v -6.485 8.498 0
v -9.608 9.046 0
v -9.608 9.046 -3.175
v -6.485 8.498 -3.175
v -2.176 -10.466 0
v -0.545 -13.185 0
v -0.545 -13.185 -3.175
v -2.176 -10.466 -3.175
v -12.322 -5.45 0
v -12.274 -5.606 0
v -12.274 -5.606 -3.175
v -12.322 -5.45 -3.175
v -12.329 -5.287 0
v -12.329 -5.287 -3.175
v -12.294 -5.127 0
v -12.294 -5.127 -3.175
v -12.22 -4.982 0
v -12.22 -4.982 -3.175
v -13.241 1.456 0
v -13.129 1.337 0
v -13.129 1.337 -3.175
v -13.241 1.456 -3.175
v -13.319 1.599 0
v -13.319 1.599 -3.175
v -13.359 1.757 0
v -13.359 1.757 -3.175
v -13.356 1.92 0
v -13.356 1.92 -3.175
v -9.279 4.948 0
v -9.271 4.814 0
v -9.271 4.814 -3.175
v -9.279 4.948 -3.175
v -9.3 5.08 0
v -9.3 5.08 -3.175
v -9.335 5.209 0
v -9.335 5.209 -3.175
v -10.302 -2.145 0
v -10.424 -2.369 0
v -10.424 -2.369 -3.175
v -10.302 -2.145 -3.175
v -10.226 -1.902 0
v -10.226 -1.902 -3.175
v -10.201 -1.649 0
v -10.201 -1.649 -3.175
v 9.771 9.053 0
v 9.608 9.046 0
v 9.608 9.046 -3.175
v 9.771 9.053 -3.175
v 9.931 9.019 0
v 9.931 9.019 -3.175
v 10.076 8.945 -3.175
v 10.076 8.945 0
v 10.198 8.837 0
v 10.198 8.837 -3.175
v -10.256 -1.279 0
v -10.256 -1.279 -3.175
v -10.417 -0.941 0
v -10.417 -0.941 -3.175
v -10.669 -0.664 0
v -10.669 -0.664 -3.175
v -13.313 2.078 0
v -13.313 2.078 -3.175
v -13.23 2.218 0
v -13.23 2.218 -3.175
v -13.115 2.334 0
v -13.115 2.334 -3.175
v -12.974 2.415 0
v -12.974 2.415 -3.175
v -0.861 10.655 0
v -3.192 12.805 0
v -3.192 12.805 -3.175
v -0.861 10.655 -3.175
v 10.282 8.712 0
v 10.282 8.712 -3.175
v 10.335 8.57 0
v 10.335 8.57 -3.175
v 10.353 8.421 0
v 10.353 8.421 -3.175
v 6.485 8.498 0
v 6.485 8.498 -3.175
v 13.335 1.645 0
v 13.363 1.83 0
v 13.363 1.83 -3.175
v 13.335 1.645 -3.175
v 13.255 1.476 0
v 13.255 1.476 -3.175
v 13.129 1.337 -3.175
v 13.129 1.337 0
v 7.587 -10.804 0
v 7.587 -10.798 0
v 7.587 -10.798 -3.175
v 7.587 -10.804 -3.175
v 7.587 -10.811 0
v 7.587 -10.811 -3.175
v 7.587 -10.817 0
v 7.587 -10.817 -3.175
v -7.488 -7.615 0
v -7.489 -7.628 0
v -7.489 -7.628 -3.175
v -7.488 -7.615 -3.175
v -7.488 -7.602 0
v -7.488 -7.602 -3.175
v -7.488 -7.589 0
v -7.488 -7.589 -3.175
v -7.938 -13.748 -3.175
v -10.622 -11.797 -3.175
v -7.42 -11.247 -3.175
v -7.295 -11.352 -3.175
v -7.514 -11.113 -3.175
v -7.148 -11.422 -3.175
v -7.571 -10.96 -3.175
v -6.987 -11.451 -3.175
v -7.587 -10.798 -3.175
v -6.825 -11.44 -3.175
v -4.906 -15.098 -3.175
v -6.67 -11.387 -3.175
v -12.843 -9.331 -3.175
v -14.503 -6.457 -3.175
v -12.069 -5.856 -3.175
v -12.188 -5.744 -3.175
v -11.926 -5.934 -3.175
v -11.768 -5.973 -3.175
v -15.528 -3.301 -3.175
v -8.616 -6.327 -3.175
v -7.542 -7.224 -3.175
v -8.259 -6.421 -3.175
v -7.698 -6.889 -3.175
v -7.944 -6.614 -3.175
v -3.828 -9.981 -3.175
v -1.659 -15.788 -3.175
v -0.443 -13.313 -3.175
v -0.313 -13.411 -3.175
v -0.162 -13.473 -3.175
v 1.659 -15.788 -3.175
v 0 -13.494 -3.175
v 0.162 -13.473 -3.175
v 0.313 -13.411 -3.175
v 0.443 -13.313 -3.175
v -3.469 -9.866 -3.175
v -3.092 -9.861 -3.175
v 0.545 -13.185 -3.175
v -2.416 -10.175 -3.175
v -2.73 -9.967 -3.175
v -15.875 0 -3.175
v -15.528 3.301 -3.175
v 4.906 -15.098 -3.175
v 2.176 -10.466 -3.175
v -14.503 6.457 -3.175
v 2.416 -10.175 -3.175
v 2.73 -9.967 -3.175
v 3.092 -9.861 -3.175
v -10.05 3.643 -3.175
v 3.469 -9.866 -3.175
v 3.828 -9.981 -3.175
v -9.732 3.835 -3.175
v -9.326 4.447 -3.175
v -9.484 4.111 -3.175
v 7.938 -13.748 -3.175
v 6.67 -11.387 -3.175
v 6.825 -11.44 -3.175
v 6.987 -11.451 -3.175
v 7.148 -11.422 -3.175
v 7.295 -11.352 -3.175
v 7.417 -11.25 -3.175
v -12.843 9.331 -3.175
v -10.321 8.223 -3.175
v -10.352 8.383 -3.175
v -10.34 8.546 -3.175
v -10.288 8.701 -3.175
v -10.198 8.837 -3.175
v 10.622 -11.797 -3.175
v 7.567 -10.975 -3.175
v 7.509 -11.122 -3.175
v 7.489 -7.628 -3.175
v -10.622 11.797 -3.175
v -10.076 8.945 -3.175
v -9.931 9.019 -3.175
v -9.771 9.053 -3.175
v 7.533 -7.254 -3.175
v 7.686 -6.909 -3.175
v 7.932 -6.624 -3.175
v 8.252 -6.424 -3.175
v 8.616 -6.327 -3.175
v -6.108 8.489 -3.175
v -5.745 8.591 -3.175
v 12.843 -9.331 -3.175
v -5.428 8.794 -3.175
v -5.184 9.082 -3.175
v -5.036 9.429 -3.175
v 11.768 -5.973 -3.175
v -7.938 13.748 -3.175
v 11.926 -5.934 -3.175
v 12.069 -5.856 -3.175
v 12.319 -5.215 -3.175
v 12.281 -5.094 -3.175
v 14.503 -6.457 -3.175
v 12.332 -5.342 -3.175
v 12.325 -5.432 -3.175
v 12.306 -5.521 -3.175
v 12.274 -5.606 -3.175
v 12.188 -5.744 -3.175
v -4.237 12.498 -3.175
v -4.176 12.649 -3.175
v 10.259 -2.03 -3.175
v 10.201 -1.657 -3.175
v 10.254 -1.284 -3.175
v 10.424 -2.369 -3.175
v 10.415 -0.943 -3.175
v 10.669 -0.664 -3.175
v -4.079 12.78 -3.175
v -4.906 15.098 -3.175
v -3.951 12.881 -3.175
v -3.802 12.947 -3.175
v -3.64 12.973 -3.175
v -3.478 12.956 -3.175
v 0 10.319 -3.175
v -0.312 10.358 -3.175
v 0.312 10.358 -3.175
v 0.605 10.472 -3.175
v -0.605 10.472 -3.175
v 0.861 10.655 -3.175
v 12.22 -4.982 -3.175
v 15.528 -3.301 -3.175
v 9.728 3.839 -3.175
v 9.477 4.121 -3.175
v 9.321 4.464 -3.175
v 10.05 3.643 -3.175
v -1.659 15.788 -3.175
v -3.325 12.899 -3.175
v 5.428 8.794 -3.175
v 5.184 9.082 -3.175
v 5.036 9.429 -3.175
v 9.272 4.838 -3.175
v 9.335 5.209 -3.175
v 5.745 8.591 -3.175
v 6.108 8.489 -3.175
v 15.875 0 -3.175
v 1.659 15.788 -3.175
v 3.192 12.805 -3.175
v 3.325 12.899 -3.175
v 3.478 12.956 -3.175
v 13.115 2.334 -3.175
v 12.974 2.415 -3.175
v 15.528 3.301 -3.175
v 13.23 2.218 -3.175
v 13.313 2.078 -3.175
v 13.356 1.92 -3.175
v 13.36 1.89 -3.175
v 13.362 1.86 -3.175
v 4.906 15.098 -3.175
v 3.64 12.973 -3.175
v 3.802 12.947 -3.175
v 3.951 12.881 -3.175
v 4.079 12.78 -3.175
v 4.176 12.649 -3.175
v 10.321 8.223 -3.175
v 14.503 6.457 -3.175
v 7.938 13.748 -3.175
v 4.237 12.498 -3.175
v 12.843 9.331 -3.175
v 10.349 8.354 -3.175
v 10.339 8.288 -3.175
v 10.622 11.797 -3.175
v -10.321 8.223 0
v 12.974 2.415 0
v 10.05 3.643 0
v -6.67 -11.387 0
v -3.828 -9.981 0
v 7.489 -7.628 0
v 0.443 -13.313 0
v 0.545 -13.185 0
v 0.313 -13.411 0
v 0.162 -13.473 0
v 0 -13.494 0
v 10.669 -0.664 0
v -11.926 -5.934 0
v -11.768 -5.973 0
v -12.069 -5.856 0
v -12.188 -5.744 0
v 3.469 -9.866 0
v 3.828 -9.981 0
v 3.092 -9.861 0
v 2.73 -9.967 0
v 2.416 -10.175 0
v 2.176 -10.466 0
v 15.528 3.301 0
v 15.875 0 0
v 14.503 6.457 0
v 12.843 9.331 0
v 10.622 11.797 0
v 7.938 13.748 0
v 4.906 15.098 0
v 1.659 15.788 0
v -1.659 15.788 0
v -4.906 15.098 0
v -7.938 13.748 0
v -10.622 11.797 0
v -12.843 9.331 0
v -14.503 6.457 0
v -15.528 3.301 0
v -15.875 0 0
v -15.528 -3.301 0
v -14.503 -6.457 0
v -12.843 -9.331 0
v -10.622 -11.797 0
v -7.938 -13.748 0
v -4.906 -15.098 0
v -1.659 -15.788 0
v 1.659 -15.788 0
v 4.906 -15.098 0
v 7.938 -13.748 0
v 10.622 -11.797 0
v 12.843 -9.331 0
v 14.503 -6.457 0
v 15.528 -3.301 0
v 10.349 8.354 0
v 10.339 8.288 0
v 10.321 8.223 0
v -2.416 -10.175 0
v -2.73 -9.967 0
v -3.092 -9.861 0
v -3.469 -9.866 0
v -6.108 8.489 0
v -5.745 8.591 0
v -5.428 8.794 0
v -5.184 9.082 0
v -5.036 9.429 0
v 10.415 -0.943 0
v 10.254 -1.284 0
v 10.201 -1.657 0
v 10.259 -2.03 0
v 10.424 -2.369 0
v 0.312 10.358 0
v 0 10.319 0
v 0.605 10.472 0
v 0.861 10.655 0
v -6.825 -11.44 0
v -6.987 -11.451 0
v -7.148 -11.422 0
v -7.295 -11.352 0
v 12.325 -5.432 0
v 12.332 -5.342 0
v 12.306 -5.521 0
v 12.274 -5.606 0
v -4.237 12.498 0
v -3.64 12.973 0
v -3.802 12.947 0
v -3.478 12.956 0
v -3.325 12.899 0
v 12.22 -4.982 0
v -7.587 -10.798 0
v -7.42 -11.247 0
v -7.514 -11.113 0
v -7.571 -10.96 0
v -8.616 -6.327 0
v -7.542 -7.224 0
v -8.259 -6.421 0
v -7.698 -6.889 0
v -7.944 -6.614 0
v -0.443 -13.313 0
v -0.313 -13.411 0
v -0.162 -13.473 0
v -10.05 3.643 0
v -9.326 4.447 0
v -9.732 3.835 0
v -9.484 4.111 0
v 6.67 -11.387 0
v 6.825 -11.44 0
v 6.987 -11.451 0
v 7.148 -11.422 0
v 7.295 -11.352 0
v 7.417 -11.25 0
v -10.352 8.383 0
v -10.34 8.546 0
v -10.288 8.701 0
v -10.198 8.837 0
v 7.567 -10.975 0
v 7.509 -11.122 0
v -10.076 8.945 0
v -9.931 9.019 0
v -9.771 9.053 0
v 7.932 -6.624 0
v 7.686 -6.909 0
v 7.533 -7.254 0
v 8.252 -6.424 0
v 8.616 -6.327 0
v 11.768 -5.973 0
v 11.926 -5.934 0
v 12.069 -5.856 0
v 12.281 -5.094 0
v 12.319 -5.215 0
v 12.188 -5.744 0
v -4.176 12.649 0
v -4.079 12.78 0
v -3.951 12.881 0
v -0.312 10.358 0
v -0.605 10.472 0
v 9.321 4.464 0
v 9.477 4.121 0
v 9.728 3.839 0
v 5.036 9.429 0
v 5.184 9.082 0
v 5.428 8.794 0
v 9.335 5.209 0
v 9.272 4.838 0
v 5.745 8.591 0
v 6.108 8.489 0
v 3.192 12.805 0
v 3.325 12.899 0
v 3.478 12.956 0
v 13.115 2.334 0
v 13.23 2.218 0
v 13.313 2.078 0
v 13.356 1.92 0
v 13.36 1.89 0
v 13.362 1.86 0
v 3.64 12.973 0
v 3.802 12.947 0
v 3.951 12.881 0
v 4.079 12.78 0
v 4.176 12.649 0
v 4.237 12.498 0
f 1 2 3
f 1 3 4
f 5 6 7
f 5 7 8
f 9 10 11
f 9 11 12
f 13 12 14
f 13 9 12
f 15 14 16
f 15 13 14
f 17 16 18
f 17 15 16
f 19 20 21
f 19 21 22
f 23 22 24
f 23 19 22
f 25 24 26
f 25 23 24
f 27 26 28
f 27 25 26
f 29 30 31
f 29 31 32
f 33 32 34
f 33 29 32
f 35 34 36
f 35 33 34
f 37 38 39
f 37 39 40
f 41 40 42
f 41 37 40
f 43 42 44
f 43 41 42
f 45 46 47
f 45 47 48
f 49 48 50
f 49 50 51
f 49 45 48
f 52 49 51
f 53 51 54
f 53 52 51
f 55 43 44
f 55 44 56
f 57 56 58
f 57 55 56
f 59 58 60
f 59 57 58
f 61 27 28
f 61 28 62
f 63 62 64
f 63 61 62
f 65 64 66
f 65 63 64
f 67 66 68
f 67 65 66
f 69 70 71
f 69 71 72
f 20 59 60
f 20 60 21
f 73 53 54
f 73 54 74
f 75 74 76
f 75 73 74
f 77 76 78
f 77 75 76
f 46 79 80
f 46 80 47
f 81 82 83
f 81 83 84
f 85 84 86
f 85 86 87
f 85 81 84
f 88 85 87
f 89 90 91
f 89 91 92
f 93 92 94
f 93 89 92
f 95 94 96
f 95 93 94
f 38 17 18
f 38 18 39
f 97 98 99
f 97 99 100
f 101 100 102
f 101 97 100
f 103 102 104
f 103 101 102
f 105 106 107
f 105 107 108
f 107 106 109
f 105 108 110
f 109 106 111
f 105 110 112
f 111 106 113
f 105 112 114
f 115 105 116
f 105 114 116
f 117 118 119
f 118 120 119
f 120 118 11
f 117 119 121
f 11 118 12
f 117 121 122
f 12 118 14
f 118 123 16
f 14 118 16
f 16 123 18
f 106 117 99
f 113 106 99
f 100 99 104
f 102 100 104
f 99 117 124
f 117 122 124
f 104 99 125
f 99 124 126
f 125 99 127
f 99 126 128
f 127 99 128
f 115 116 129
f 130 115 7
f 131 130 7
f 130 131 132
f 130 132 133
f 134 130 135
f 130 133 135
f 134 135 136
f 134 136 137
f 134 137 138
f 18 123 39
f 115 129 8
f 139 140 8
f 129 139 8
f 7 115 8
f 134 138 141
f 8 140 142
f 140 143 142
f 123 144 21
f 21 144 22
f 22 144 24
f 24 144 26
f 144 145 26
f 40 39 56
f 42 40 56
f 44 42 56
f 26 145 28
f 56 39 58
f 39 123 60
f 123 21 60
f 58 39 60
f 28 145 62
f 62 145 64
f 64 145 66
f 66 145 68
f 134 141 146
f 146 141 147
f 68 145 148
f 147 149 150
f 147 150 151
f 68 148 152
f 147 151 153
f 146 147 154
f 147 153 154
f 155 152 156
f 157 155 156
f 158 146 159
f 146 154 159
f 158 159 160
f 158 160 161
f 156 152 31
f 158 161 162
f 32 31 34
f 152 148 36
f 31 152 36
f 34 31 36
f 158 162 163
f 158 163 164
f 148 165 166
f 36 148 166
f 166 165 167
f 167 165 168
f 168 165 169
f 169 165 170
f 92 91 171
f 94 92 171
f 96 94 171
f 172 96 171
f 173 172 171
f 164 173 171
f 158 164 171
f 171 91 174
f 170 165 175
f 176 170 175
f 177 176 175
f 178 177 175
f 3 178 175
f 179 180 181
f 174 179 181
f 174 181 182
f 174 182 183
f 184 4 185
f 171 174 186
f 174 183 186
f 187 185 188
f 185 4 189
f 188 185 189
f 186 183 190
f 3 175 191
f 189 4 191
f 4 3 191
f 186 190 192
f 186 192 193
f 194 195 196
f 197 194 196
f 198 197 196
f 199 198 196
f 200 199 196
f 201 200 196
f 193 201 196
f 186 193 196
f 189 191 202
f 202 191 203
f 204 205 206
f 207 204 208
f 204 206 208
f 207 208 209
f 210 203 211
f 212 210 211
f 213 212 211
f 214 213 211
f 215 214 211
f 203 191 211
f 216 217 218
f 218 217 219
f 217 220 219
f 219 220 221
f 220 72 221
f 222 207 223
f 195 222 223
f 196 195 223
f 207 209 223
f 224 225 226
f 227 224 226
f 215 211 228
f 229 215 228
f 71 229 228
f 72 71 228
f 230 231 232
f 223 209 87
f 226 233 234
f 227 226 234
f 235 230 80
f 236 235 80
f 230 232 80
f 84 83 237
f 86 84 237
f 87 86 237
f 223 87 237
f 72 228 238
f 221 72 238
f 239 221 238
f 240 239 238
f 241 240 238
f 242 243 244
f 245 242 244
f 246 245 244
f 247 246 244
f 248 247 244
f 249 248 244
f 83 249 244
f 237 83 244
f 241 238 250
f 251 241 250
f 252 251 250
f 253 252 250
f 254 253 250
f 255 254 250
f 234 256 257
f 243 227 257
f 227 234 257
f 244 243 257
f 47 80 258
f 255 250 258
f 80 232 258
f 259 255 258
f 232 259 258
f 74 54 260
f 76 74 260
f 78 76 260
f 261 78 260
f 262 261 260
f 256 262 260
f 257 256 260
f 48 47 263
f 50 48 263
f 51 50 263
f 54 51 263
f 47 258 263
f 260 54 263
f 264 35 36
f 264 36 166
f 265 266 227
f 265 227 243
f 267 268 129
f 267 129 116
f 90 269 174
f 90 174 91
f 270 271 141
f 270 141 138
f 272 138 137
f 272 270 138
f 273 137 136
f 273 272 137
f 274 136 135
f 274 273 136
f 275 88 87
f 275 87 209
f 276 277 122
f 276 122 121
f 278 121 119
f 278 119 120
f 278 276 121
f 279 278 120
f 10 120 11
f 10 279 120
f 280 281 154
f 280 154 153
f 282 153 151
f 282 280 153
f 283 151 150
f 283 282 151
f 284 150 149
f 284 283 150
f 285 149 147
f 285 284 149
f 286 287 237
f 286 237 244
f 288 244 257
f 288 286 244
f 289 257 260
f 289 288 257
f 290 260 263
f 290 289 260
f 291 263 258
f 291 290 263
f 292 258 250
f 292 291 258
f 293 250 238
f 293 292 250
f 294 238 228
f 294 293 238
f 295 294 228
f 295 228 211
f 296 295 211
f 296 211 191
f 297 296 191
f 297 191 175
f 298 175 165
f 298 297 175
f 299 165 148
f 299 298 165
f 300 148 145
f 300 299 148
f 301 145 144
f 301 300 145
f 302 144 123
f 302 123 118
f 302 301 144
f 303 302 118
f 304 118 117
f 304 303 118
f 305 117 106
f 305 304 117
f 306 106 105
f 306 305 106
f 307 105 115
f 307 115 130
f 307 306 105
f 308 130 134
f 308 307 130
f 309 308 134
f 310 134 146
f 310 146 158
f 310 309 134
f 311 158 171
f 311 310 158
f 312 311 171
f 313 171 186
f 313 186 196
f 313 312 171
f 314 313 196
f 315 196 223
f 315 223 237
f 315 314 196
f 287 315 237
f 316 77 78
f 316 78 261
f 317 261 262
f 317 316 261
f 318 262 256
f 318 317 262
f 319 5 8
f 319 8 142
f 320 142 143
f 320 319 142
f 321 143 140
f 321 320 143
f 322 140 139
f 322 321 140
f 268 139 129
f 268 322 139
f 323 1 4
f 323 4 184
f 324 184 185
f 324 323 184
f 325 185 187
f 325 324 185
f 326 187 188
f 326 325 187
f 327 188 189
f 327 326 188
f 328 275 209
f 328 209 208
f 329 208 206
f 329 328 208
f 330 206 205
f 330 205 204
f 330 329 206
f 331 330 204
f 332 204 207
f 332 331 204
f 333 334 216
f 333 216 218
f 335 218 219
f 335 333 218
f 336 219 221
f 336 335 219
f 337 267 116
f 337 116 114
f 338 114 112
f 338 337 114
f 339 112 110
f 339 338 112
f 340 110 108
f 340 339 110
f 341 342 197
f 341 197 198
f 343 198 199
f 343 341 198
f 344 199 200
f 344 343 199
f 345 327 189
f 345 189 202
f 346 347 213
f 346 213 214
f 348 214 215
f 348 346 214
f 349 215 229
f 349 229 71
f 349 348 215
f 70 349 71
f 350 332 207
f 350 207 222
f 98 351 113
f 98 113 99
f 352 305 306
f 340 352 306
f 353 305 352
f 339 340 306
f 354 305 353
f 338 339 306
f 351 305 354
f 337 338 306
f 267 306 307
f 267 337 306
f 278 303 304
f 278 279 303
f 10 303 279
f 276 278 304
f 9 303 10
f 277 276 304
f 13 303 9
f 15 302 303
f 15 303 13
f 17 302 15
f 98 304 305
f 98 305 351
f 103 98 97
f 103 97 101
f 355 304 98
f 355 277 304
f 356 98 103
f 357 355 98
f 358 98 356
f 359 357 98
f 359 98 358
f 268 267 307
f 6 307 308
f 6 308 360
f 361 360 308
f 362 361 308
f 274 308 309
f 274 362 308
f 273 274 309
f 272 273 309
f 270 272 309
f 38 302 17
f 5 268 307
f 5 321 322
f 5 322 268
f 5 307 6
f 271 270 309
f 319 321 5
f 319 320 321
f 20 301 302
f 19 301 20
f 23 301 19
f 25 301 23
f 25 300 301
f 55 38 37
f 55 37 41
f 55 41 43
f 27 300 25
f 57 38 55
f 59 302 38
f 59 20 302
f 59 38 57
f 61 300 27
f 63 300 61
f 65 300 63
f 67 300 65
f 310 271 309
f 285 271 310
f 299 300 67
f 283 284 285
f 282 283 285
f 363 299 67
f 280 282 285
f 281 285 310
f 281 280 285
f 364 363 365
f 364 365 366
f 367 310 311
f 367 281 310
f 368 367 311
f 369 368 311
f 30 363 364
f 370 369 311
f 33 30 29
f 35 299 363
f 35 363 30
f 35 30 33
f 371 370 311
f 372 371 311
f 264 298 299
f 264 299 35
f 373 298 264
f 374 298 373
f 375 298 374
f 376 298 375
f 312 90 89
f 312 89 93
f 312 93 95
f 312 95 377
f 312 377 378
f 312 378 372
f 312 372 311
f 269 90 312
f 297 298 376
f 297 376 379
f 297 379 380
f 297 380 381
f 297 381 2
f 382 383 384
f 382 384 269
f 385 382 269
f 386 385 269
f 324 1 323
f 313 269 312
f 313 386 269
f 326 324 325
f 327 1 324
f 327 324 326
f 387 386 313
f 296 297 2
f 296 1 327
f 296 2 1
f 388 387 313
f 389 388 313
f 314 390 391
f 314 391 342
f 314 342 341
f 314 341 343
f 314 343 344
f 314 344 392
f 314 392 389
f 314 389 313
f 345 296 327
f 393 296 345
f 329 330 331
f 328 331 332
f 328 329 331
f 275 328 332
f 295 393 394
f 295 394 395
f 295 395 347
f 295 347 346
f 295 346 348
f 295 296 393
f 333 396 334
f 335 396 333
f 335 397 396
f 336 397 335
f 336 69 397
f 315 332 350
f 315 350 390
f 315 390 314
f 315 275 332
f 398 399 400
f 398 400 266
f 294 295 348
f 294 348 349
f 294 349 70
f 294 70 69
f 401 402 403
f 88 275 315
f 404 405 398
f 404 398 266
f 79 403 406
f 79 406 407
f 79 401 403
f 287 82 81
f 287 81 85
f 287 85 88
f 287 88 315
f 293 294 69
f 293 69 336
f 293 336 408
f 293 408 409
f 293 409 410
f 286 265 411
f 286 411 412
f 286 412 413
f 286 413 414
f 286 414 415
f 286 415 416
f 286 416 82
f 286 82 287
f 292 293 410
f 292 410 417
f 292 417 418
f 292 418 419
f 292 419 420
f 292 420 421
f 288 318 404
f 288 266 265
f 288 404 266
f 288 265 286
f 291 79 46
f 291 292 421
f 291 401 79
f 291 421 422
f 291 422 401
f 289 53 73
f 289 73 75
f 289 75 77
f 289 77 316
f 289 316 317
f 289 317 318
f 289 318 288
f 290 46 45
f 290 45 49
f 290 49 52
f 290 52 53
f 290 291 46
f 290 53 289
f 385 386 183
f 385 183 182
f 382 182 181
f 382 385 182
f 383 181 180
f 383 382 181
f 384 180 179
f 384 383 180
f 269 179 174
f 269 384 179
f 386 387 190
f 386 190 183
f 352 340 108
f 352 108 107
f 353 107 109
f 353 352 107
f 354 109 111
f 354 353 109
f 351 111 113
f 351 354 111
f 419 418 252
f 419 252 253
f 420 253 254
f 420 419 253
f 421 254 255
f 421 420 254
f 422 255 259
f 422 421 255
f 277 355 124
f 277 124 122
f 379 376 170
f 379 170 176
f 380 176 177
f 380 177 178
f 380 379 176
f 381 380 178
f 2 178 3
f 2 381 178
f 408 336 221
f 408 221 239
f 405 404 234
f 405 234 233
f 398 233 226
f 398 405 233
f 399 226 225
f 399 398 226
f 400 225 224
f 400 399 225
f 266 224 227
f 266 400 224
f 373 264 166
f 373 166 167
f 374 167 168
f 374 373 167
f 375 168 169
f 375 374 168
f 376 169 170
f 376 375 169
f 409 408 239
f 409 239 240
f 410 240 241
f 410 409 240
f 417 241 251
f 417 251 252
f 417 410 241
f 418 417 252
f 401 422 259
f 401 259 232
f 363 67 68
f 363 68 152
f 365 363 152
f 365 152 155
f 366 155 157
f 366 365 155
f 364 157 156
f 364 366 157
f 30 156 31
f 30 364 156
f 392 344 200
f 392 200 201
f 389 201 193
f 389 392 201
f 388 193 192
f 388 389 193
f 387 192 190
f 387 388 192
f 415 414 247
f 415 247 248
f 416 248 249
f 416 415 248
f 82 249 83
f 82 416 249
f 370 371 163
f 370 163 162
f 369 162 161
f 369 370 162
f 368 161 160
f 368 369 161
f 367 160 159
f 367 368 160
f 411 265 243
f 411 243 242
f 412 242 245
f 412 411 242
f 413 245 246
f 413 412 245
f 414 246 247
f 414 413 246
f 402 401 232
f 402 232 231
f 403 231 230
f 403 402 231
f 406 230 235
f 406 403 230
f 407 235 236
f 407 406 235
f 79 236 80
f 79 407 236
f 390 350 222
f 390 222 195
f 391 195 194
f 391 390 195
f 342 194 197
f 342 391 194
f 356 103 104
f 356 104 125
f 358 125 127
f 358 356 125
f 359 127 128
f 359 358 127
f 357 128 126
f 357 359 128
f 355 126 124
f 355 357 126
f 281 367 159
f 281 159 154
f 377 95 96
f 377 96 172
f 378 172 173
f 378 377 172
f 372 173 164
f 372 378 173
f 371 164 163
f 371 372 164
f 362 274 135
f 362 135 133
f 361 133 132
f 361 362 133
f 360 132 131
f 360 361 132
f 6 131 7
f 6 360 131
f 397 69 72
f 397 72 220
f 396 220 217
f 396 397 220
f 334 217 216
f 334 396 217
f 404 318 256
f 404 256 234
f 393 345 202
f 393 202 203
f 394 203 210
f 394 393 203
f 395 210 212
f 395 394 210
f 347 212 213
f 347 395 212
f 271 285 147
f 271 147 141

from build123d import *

# Parameters (mm, degrees)
F0_R     = 15.875
F1_DEPTH = 3.175


with BuildPart() as f1:
    # F0 (on Top) → F1 (new body)
    with BuildSketch(Plane.XY):
        Circle(F0_R)
        with BuildLine():
            ThreePointArc((0, 13.49375), (1.920361, 13.356403), (3.801629, 12.947158))
            ThreePointArc((3.801629, 12.947158), (7.295272, 11.351665), (10.197896, 8.836527))
            ThreePointArc((10.197896, 8.836527), (12.274347, 5.605506), (13.356403, 1.920361))
            ThreePointArc((13.356403, 1.920361), (13.459369, 0.962633), (13.49375, 0))
            ThreePointArc((13.49375, 0), (13.185376, -2.868303), (12.274347, -5.605506))
            ThreePointArc((12.274347, -5.605506), (10.197896, -8.836527), (7.295272, -11.351665))
            ThreePointArc((7.295272, -11.351665), (3.801629, -12.947158), (0, -13.49375))
            ThreePointArc((0, -13.49375), (-3.801629, -12.947158), (-7.295272, -11.351665))
            ThreePointArc((-7.295272, -11.351665), (-10.197896, -8.836527), (-12.274347, -5.605506))
            ThreePointArc((-12.274347, -5.605506), (-13.356403, -1.920361), (-13.356403, 1.920361))
            ThreePointArc((-13.356403, 1.920361), (-12.274347, 5.605506), (-10.197896, 8.836527))
            ThreePointArc((-10.197896, 8.836527), (-7.295272, 11.351665), (-3.801629, 12.947158))
            ThreePointArc((-3.801629, 12.947158), (-1.920361, 13.356403), (0, 13.49375))
        make_face(mode=Mode.SUBTRACT)
        with BuildLine():
            ThreePointArc((-4.237237, 12.497892), (-4.078617, 12.77991), (-3.801629, 12.947158))
            ThreePointArc((-3.801629, 12.947158), (-7.295272, 11.351665), (-10.197896, 8.836527))
            ThreePointArc((-10.197896, 8.836527), (-9.930697, 9.019007), (-9.608271, 9.046139))
            Line((-9.608271, 9.046139), (-6.484799, 8.49818))
            ThreePointArc((-6.484799, 8.49818), (-7.082113, 10.721599), (-4.995351, 9.749077))
            ThreePointArc((-4.995351, 9.749077), (-5.005639, 9.587758), (-5.036334, 9.429053))
            Line((-5.036334, 9.429053), (-4.237237, 12.497892))
        make_face()
        with BuildLine():
            ThreePointArc((-6.484799, 8.49818), (-5.578737, 8.680685), (-5.036334, 9.429053))
            ThreePointArc((-5.036334, 9.429053), (-5.005639, 9.587758), (-4.995351, 9.749077))
            ThreePointArc((-4.995351, 9.749077), (-7.082113, 10.721599), (-6.484799, 8.49818))
        make_face()
        with BuildLine():
            ThreePointArc((-13.128695, 1.337485), (-13.319334, 1.598926), (-13.356403, 1.920361))
            ThreePointArc((-13.356403, 1.920361), (-13.356403, -1.920361), (-12.274347, -5.605506))
            ThreePointArc((-12.274347, -5.605506), (-12.329338, -5.286648), (-12.220077, -4.982089))
            Line((-12.220077, -4.982089), (-10.4241, -2.368509))
            ThreePointArc((-10.4241, -2.368509), (-12.727866, -1.829991), (-10.669136, -0.66424))
            Line((-10.669136, -0.66424), (-13.128695, 1.337485))
        make_face()
        with BuildLine():
            ThreePointArc((-10.200793, -1.649251), (-10.32384, -1.103909), (-10.669136, -0.66424))
            ThreePointArc((-10.669136, -0.66424), (-12.727866, -1.829991), (-10.4241, -2.368509))
            ThreePointArc((-10.4241, -2.368509), (-10.257904, -2.025814), (-10.200793, -1.649251))
        make_face()
        with BuildLine():
            ThreePointArc((-10.321462, 8.223073), (-10.340492, 8.546078), (-10.197896, 8.836527))
            ThreePointArc((-10.197896, 8.836527), (-12.274347, 5.605506), (-13.356403, 1.920361))
            ThreePointArc((-13.356403, 1.920361), (-13.230277, 2.218332), (-12.973704, 2.415473))
            Line((-12.973704, 2.415473), (-10.049823, 3.643177))
            ThreePointArc((-10.049823, 3.643177), (-11.69673, 5.341718), (-9.334564, 5.209376))
            Line((-9.334564, 5.209376), (-10.321462, 8.223073))
        make_face()
        with BuildLine():
            ThreePointArc((-9.271498, 4.814141), (-9.287363, 5.014259), (-9.334564, 5.209376))
            ThreePointArc((-9.334564, 5.209376), (-11.69673, 5.341718), (-10.049823, 3.643177))
            ThreePointArc((-10.049823, 3.643177), (-9.483829, 4.111121), (-9.271498, 4.814141))
        make_face()
        with BuildLine():
            Line((0, 12.85875), (0, 13.49375))
            ThreePointArc((0, 13.49375), (-1.920361, 13.356403), (-3.801629, 12.947158))
            ThreePointArc((-3.801629, 12.947158), (-3.47819, 12.956212), (-3.19228, 12.80472))
            Line((-3.19228, 12.80472), (-0.860897, 10.655071))
            ThreePointArc((-0.860897, 10.655071), (-1.182935, 12.05088), (0, 12.85875))
        make_face()
        with BuildLine():
            ThreePointArc((1.27, 11.58875), (0.898026, 12.486776), (0, 12.85875))
            Line((0, 12.85875), (0, 10.31875))
            ThreePointArc((0, 10.31875), (0.46213, 10.405815), (0.860897, 10.655071))
            ThreePointArc((0.860897, 10.655071), (1.163237, 11.079064), (1.27, 11.58875))
        make_face()
        with BuildLine():
            ThreePointArc((3.19228, 12.80472), (3.47819, 12.956212), (3.801629, 12.947158))
            ThreePointArc((3.801629, 12.947158), (1.920361, 13.356403), (0, 13.49375))
            Line((0, 13.49375), (0, 12.85875))
            ThreePointArc((0, 12.85875), (0.898026, 12.486776), (1.27, 11.58875))
            ThreePointArc((1.27, 11.58875), (1.163237, 11.079064), (0.860897, 10.655071))
            Line((0.860897, 10.655071), (3.19228, 12.80472))
        make_face()
        with BuildLine():
            Line((0, 10.31875), (0, 12.85875))
            ThreePointArc((0, 12.85875), (-1.182935, 12.05088), (-0.860897, 10.655071))
            ThreePointArc((-0.860897, 10.655071), (-0.46213, 10.405815), (0, 10.31875))
        make_face()
        with BuildLine():
            ThreePointArc((10.197896, 8.836527), (7.295272, 11.351665), (3.801629, 12.947158))
            ThreePointArc((3.801629, 12.947158), (4.078617, 12.77991), (4.237237, 12.497892))
            Line((4.237237, 12.497892), (5.036334, 9.429053))
            ThreePointArc((5.036334, 9.429053), (6.104032, 11.00879), (7.535351, 9.749077))
            ThreePointArc((7.535351, 9.749077), (7.237874, 8.932315), (6.484799, 8.49818))
            Line((6.484799, 8.49818), (9.608271, 9.046139))
            ThreePointArc((9.608271, 9.046139), (9.930697, 9.019007), (10.197896, 8.836527))
        make_face()
        with BuildLine():
            ThreePointArc((7.535351, 9.749077), (6.104032, 11.00879), (5.036334, 9.429053))
            ThreePointArc((5.036334, 9.429053), (5.578737, 8.680685), (6.484799, 8.49818))
            ThreePointArc((6.484799, 8.49818), (7.237874, 8.932315), (7.535351, 9.749077))
        make_face()
        with BuildLine():
            ThreePointArc((13.356403, 1.920361), (12.274347, 5.605506), (10.197896, 8.836527))
            ThreePointArc((10.197896, 8.836527), (10.312958, 8.6426), (10.352995, 8.420691))
            ThreePointArc((10.352995, 8.420691), (10.345062, 8.320632), (10.321462, 8.223073))
            Line((10.321462, 8.223073), (9.334564, 5.209376))
            ThreePointArc((9.334564, 5.209376), (10.741616, 6.068275), (11.811498, 4.814141))
            ThreePointArc((11.811498, 4.814141), (11.244518, 3.756472), (10.049823, 3.643177))
            Line((10.049823, 3.643177), (12.973704, 2.415473))
            ThreePointArc((12.973704, 2.415473), (13.230277, 2.218332), (13.356403, 1.920361))
        make_face()
        with BuildLine():
            ThreePointArc((9.334564, 5.209376), (9.386265, 4.286564), (10.049823, 3.643177))
            ThreePointArc((10.049823, 3.643177), (11.244518, 3.756472), (11.811498, 4.814141))
            ThreePointArc((11.811498, 4.814141), (10.741616, 6.068275), (9.334564, 5.209376))
        make_face()
        with BuildLine():
            ThreePointArc((13.49375, 0), (13.459369, 0.962633), (13.356403, 1.920361))
            ThreePointArc((13.356403, 1.920361), (13.361249, 1.875291), (13.362866, 1.829991))
            ThreePointArc((13.362866, 1.829991), (13.301343, 1.55732), (13.128695, 1.337486))
            Line((13.128695, 1.337486), (10.669136, -0.66424))
            ThreePointArc((10.669136, -0.66424), (12.016135, -0.502298), (12.740793, -1.649251))
            ThreePointArc((12.740793, -1.649251), (11.847356, -2.86214), (10.4241, -2.368509))
            Line((10.4241, -2.368509), (12.220077, -4.982089))
            ThreePointArc((12.220077, -4.982089), (12.303175, -5.153436), (12.33173, -5.341718))
            ThreePointArc((12.33173, -5.341718), (12.317219, -5.476697), (12.274347, -5.605506))
            ThreePointArc((12.274347, -5.605506), (13.185376, -2.868303), (13.49375, 0))
        make_face()
        with BuildLine():
            ThreePointArc((12.740793, -1.649251), (12.016135, -0.502298), (10.669136, -0.66424))
            ThreePointArc((10.669136, -0.66424), (10.21372, -1.468511), (10.4241, -2.368509))
            ThreePointArc((10.4241, -2.368509), (11.847356, -2.86214), (12.740793, -1.649251))
        make_face()
        with BuildLine():
            ThreePointArc((7.295272, -11.351665), (10.197896, -8.836527), (12.274347, -5.605506))
            ThreePointArc((12.274347, -5.605506), (12.069382, -5.855873), (11.76766, -5.972744))
            Line((11.76766, -5.972744), (8.616333, -6.326965))
            ThreePointArc((8.616333, -6.326965), (9.604579, -6.642164), (10.028193, -7.589017))
            ThreePointArc((10.028193, -7.589017), (8.777792, -8.858866), (7.488798, -7.628211))
            Line((7.488798, -7.628211), (7.586663, -10.797872))
            ThreePointArc((7.586663, -10.797872), (7.58689, -10.807669), (7.586965, -10.817469))
            ThreePointArc((7.586965, -10.817469), (7.509291, -11.121792), (7.295272, -11.351665))
        make_face()
        with BuildLine():
            ThreePointArc((10.028193, -7.589017), (9.604579, -6.642164), (8.616333, -6.326965))
            ThreePointArc((8.616333, -6.326965), (7.798391, -6.757344), (7.488798, -7.628211))
            ThreePointArc((7.488798, -7.628211), (8.777792, -8.858866), (10.028193, -7.589017))
        make_face()
        with BuildLine():
            ThreePointArc((0, -13.49375), (3.801629, -12.947158), (7.295272, -11.351665))
            ThreePointArc((7.295272, -11.351665), (6.987486, -11.451475), (6.670477, -11.386669))
            Line((6.670477, -11.386669), (3.827905, -9.980923))
            ThreePointArc((3.827905, -9.980923), (4.343789, -10.44928), (4.534928, -11.119324))
            ThreePointArc((4.534928, -11.119324), (2.925975, -12.343257), (2.175856, -10.466009))
            Line((2.175856, -10.466009), (0.544536, -13.185408))
            ThreePointArc((0.544536, -13.185408), (0.312888, -13.411313), (0, -13.49375))
        make_face()
        with BuildLine():
            ThreePointArc((4.534928, -11.119324), (4.343789, -10.44928), (3.827905, -9.980923))
            ThreePointArc((3.827905, -9.980923), (2.907128, -9.900768), (2.175856, -10.466009))
            ThreePointArc((2.175856, -10.466009), (2.925975, -12.343257), (4.534928, -11.119324))
        make_face()
        with BuildLine():
            ThreePointArc((-6.670476, -11.386669), (-6.987486, -11.451475), (-7.295272, -11.351665))
            ThreePointArc((-7.295272, -11.351665), (-3.801629, -12.947158), (0, -13.49375))
            ThreePointArc((0, -13.49375), (-0.312888, -13.411313), (-0.544536, -13.185408))
            Line((-0.544536, -13.185408), (-2.175856, -10.466009))
            ThreePointArc((-2.175856, -10.466009), (-2.040996, -10.780371), (-1.994928, -11.119324))
            ThreePointArc((-1.994928, -11.119324), (-3.934973, -12.198185), (-3.827905, -9.980923))
            Line((-3.827905, -9.980923), (-6.670476, -11.386669))
        make_face()
        with BuildLine():
            ThreePointArc((-2.175856, -10.466009), (-2.907128, -9.900768), (-3.827905, -9.980923))
            ThreePointArc((-3.827905, -9.980923), (-3.934973, -12.198185), (-1.994928, -11.119324))
            ThreePointArc((-1.994928, -11.119324), (-2.040996, -10.780371), (-2.175856, -10.466009))
        make_face()
        with BuildLine():
            ThreePointArc((-11.76766, -5.972744), (-12.069382, -5.855874), (-12.274347, -5.605506))
            ThreePointArc((-12.274347, -5.605506), (-10.197896, -8.836527), (-7.295272, -11.351665))
            ThreePointArc((-7.295272, -11.351665), (-7.513921, -11.113155), (-7.586663, -10.797872))
            Line((-7.586663, -10.797872), (-7.488798, -7.628211))
            ThreePointArc((-7.488798, -7.628211), (-9.717995, -8.42069), (-8.616333, -6.326965))
            Line((-8.616333, -6.326965), (-11.76766, -5.972744))
        make_face()
        with BuildLine():
            ThreePointArc((-7.488193, -7.589017), (-7.81134, -6.742631), (-8.616333, -6.326965))
            ThreePointArc((-8.616333, -6.326965), (-9.717995, -8.42069), (-7.488798, -7.628211))
            ThreePointArc((-7.488798, -7.628211), (-7.488344, -7.608616), (-7.488193, -7.589017))
        make_face()
    extrude(amount=-F1_DEPTH)


solid = f1.part
